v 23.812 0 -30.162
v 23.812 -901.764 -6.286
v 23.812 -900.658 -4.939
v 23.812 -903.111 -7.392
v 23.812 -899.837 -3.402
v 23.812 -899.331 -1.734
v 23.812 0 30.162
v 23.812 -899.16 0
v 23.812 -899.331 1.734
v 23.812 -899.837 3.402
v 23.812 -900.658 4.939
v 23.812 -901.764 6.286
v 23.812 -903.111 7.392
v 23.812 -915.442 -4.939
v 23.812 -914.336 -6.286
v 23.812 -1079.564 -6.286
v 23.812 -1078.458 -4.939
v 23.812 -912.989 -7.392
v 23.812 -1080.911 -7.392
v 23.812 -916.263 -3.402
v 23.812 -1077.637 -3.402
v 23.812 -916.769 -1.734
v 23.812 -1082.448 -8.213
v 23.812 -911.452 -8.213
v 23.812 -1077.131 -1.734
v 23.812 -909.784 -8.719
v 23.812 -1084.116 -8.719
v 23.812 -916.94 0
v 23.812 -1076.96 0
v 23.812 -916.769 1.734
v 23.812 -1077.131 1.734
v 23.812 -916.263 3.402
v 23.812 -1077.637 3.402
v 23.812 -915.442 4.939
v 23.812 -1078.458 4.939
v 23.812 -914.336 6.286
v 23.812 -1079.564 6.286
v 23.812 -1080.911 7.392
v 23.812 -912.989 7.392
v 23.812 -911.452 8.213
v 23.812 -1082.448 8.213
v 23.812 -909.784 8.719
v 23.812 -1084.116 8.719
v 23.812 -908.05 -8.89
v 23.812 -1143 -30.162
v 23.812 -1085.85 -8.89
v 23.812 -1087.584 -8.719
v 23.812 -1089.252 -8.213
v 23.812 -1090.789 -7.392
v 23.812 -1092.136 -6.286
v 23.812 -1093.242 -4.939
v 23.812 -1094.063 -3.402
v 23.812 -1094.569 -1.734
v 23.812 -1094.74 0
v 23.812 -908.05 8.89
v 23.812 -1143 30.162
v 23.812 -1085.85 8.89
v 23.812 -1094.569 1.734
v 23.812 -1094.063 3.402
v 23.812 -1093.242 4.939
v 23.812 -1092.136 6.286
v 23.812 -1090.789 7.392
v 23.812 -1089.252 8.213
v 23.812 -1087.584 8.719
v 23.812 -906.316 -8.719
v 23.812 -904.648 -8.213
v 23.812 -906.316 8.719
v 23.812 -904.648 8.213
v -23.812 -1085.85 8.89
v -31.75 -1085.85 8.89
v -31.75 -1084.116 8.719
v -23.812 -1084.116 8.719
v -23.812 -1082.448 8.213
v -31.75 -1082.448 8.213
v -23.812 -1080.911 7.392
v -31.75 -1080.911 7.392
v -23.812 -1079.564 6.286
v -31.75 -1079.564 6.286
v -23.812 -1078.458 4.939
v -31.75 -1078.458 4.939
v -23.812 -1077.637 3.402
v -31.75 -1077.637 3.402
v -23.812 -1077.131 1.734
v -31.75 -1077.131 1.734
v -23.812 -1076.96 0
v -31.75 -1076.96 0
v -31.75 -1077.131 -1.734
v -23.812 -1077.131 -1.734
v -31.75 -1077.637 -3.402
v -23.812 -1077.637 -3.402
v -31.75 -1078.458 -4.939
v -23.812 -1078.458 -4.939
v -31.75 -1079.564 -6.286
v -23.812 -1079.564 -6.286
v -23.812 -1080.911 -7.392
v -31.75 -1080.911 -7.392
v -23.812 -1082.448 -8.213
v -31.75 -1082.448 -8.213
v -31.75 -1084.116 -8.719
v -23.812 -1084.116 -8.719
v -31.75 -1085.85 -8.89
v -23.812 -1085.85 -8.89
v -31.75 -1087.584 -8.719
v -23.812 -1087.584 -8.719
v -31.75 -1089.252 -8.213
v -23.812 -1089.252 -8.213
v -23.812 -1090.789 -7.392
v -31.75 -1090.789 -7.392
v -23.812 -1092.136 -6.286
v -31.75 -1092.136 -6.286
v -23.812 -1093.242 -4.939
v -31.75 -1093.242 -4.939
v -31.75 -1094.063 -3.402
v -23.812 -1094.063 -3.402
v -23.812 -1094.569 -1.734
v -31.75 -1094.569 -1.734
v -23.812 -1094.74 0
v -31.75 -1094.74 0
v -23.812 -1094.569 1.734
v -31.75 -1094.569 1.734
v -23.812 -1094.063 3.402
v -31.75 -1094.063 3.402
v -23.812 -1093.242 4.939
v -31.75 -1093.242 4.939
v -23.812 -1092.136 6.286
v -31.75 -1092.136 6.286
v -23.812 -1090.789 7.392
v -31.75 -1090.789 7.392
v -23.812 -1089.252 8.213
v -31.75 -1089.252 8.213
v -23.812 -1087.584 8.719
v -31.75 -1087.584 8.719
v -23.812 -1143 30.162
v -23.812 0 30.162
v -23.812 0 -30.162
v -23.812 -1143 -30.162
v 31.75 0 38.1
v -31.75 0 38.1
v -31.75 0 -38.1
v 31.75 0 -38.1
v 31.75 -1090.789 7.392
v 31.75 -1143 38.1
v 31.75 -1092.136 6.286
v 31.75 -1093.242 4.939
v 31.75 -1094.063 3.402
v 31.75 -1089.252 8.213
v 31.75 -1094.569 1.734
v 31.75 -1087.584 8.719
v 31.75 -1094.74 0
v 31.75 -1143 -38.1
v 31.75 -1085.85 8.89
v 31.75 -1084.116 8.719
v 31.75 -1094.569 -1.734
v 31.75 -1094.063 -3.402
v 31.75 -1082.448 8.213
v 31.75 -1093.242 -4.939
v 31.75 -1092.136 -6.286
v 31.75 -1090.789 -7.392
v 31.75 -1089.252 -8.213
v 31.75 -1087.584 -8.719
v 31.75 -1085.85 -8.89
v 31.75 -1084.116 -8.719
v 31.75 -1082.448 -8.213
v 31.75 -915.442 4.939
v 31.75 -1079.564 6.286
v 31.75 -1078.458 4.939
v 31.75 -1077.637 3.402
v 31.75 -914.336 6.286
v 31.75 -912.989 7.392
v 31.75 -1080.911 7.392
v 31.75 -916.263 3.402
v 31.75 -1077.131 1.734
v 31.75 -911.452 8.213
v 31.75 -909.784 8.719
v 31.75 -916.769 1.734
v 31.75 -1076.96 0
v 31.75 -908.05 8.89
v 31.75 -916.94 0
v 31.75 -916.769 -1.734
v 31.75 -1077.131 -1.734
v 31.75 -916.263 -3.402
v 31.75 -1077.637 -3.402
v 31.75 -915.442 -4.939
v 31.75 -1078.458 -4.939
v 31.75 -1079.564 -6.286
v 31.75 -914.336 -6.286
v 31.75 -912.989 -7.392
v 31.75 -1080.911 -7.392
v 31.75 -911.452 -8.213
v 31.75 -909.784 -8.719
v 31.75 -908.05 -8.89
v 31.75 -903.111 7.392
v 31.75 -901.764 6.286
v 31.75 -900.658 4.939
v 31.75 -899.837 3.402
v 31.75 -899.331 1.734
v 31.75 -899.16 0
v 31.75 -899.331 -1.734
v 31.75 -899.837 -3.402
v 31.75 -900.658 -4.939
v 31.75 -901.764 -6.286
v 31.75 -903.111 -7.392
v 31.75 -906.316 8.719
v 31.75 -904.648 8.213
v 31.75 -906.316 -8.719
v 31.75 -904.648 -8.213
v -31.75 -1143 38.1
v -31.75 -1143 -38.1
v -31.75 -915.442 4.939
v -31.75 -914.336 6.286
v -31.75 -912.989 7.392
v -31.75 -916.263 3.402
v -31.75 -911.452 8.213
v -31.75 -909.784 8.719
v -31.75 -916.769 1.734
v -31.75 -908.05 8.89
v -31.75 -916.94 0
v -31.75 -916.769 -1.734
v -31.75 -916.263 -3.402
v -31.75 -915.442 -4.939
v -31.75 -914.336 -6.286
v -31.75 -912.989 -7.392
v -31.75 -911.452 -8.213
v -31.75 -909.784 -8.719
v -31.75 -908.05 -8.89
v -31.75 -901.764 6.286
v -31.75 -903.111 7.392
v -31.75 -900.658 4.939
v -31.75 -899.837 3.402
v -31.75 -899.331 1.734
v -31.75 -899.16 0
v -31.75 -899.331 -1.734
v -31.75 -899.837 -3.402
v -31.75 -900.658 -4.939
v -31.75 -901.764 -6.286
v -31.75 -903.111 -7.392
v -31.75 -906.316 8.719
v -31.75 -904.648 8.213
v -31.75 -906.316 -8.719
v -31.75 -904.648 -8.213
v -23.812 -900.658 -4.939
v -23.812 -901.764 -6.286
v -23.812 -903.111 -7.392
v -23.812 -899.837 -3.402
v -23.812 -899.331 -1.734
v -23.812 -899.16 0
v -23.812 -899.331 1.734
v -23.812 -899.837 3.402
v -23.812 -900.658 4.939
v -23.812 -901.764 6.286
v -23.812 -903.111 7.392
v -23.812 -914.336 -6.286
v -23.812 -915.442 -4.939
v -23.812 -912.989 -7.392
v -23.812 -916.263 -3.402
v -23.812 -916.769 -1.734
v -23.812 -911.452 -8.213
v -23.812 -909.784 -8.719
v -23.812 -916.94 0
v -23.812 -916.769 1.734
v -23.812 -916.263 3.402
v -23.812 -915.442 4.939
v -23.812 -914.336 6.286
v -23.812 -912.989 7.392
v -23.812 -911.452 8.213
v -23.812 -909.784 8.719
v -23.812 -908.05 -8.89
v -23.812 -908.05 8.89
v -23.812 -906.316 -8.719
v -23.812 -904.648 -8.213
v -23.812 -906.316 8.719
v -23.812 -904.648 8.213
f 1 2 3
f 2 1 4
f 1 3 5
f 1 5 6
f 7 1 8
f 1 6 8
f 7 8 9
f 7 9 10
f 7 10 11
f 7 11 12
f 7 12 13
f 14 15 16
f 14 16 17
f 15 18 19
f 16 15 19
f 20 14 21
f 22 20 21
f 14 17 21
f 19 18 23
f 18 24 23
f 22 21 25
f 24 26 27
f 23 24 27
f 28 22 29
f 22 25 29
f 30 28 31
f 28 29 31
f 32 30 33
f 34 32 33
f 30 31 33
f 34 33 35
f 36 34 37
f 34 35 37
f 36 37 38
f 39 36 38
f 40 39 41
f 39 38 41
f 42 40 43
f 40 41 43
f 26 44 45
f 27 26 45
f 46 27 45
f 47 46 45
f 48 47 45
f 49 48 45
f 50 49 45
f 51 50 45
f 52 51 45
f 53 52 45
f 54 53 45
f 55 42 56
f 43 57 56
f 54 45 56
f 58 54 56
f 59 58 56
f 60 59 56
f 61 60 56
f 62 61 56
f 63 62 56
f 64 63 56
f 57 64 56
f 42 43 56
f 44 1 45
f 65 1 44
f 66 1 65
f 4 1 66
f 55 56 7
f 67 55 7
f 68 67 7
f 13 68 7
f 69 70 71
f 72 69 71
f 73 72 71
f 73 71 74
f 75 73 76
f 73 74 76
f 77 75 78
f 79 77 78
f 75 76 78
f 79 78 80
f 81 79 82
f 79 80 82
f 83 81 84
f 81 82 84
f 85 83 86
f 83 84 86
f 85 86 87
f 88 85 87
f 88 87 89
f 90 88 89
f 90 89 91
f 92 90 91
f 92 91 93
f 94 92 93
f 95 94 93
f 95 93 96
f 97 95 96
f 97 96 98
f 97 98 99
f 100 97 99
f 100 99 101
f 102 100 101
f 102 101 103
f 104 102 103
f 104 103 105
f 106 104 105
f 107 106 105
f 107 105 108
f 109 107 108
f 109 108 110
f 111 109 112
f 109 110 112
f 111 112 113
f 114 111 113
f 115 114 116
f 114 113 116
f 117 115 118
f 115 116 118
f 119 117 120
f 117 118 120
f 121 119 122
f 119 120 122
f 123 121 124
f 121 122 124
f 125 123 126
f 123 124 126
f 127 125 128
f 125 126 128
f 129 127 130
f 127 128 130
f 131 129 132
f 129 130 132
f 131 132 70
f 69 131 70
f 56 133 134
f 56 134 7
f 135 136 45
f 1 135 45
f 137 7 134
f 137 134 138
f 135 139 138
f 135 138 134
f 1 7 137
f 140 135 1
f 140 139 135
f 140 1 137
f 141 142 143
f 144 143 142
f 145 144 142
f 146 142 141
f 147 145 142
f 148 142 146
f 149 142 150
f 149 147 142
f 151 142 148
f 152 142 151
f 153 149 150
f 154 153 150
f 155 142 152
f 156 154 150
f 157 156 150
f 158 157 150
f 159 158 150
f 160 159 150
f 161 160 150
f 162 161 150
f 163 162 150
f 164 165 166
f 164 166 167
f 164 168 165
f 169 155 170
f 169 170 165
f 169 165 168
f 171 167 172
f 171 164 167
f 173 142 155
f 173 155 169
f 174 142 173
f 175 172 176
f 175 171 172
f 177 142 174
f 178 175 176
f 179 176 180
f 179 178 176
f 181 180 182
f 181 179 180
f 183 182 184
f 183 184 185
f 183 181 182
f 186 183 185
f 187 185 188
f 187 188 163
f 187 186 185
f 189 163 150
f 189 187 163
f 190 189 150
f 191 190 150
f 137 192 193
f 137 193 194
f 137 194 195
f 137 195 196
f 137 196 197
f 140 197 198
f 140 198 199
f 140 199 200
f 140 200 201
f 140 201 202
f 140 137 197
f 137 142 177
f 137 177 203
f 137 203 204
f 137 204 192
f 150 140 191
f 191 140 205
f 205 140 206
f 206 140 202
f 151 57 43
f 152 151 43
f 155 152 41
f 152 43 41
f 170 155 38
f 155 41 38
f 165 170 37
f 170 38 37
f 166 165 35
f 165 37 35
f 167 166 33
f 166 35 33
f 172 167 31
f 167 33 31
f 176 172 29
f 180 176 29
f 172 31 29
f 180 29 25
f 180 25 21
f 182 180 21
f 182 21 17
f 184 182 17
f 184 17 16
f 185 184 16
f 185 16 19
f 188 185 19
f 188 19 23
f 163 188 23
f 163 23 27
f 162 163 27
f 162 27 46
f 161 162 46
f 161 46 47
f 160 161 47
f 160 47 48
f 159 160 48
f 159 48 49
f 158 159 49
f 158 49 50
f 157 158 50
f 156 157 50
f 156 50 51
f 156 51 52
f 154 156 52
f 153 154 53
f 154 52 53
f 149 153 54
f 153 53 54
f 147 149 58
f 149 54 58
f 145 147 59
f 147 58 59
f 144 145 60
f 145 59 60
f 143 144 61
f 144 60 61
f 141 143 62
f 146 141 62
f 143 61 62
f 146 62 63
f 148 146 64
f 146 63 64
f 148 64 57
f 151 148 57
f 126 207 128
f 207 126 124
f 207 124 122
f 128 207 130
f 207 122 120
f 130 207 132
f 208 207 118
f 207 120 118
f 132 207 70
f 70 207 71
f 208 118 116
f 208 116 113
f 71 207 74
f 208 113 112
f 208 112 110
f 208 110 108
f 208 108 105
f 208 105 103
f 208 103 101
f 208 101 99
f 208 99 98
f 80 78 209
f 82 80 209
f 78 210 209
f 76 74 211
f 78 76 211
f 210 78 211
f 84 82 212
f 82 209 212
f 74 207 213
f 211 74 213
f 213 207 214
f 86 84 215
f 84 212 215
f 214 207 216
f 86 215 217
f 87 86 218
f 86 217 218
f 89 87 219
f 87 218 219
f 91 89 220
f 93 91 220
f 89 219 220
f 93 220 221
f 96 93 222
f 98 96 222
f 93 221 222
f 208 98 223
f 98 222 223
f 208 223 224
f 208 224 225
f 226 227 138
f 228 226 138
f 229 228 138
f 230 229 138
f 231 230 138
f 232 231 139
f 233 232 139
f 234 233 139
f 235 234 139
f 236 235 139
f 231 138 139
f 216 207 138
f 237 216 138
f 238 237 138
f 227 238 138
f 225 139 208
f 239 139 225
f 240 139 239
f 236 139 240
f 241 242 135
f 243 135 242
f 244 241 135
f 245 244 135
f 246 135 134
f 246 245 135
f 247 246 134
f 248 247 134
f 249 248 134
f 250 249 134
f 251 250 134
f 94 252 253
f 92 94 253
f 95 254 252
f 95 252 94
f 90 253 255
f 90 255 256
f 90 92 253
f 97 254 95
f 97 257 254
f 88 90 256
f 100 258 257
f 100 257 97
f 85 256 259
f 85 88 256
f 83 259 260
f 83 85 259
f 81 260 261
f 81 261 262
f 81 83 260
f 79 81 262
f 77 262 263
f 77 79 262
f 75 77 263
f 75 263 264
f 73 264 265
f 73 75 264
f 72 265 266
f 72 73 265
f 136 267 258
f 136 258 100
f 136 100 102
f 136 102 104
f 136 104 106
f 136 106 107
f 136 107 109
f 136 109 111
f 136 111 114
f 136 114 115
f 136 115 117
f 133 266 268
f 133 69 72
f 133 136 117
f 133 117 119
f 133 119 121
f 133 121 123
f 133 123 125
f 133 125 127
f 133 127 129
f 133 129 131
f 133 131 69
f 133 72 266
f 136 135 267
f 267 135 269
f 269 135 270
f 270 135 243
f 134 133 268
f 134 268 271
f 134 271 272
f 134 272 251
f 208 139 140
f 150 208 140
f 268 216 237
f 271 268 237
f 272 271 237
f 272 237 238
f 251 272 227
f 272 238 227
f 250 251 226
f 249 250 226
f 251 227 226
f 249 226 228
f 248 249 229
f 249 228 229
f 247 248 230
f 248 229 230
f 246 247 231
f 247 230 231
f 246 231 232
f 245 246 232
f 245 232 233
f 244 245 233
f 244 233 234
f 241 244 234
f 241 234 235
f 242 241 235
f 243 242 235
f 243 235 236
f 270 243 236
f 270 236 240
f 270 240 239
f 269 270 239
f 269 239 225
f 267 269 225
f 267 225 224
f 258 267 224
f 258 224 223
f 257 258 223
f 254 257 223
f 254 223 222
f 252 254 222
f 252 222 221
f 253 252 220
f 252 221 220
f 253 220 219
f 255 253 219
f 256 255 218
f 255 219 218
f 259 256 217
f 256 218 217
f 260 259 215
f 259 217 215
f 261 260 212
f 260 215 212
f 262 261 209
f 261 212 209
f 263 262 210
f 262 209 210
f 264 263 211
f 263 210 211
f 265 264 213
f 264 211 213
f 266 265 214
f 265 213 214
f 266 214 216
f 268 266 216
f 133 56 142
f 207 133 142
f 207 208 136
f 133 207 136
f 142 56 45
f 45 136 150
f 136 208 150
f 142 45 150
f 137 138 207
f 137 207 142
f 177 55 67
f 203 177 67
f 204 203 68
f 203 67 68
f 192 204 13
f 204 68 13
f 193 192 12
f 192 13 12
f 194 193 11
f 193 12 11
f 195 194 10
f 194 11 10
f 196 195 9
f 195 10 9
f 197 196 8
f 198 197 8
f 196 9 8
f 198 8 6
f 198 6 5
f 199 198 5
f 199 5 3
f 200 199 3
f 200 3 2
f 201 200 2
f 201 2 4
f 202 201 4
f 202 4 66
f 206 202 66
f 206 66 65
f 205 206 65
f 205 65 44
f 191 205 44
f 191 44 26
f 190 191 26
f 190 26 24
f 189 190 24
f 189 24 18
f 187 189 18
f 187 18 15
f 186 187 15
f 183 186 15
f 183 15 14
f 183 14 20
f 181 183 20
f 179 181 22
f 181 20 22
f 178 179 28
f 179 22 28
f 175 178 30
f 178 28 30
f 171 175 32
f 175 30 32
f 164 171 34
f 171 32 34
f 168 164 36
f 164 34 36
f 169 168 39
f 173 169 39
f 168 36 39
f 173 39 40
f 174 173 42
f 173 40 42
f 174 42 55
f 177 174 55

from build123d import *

# Parameters (mm, degrees)
SKETCH1_W           = 63.5
SKETCH1_H           = 76.2
BOSS_EXTRUDE1_DEPTH = 1143
SKETCH2_W           = 47.625
SKETCH2_H           = 60.325
CUT_EXTRUDE1_DEPTH  = 1145.075466261
SKETCH3_R           = 8.89
CUT_EXTRUDE2_DEPTH  = 1146.396376806


with BuildPart() as part:
    # Sketch1 → Boss-Extrude1 (new body)
    with BuildSketch(Plane(origin=(0, 0, 0), x_dir=(1, 0, 0), z_dir=(0, 1, 0))):
        Rectangle(SKETCH1_W, SKETCH1_H)
    extrude(amount=-BOSS_EXTRUDE1_DEPTH)

    # Sketch2 → Cut-Extrude1 (cut, through all)
    with BuildSketch(Plane.XZ.offset(1143)):
        Rectangle(SKETCH2_W, SKETCH2_H)
    extrude(amount=-CUT_EXTRUDE1_DEPTH, mode=Mode.SUBTRACT)

    # Sketch3 → Cut-Extrude2 (cut, through all)
    with BuildSketch(Plane.ZY.offset(31.75)):
        with Locations((0, -908.05)):
            Circle(SKETCH3_R)
        with Locations((0, -1085.85)):
            Circle(SKETCH3_R)
    extrude(amount=-CUT_EXTRUDE2_DEPTH, mode=Mode.SUBTRACT)


solid = part.part
